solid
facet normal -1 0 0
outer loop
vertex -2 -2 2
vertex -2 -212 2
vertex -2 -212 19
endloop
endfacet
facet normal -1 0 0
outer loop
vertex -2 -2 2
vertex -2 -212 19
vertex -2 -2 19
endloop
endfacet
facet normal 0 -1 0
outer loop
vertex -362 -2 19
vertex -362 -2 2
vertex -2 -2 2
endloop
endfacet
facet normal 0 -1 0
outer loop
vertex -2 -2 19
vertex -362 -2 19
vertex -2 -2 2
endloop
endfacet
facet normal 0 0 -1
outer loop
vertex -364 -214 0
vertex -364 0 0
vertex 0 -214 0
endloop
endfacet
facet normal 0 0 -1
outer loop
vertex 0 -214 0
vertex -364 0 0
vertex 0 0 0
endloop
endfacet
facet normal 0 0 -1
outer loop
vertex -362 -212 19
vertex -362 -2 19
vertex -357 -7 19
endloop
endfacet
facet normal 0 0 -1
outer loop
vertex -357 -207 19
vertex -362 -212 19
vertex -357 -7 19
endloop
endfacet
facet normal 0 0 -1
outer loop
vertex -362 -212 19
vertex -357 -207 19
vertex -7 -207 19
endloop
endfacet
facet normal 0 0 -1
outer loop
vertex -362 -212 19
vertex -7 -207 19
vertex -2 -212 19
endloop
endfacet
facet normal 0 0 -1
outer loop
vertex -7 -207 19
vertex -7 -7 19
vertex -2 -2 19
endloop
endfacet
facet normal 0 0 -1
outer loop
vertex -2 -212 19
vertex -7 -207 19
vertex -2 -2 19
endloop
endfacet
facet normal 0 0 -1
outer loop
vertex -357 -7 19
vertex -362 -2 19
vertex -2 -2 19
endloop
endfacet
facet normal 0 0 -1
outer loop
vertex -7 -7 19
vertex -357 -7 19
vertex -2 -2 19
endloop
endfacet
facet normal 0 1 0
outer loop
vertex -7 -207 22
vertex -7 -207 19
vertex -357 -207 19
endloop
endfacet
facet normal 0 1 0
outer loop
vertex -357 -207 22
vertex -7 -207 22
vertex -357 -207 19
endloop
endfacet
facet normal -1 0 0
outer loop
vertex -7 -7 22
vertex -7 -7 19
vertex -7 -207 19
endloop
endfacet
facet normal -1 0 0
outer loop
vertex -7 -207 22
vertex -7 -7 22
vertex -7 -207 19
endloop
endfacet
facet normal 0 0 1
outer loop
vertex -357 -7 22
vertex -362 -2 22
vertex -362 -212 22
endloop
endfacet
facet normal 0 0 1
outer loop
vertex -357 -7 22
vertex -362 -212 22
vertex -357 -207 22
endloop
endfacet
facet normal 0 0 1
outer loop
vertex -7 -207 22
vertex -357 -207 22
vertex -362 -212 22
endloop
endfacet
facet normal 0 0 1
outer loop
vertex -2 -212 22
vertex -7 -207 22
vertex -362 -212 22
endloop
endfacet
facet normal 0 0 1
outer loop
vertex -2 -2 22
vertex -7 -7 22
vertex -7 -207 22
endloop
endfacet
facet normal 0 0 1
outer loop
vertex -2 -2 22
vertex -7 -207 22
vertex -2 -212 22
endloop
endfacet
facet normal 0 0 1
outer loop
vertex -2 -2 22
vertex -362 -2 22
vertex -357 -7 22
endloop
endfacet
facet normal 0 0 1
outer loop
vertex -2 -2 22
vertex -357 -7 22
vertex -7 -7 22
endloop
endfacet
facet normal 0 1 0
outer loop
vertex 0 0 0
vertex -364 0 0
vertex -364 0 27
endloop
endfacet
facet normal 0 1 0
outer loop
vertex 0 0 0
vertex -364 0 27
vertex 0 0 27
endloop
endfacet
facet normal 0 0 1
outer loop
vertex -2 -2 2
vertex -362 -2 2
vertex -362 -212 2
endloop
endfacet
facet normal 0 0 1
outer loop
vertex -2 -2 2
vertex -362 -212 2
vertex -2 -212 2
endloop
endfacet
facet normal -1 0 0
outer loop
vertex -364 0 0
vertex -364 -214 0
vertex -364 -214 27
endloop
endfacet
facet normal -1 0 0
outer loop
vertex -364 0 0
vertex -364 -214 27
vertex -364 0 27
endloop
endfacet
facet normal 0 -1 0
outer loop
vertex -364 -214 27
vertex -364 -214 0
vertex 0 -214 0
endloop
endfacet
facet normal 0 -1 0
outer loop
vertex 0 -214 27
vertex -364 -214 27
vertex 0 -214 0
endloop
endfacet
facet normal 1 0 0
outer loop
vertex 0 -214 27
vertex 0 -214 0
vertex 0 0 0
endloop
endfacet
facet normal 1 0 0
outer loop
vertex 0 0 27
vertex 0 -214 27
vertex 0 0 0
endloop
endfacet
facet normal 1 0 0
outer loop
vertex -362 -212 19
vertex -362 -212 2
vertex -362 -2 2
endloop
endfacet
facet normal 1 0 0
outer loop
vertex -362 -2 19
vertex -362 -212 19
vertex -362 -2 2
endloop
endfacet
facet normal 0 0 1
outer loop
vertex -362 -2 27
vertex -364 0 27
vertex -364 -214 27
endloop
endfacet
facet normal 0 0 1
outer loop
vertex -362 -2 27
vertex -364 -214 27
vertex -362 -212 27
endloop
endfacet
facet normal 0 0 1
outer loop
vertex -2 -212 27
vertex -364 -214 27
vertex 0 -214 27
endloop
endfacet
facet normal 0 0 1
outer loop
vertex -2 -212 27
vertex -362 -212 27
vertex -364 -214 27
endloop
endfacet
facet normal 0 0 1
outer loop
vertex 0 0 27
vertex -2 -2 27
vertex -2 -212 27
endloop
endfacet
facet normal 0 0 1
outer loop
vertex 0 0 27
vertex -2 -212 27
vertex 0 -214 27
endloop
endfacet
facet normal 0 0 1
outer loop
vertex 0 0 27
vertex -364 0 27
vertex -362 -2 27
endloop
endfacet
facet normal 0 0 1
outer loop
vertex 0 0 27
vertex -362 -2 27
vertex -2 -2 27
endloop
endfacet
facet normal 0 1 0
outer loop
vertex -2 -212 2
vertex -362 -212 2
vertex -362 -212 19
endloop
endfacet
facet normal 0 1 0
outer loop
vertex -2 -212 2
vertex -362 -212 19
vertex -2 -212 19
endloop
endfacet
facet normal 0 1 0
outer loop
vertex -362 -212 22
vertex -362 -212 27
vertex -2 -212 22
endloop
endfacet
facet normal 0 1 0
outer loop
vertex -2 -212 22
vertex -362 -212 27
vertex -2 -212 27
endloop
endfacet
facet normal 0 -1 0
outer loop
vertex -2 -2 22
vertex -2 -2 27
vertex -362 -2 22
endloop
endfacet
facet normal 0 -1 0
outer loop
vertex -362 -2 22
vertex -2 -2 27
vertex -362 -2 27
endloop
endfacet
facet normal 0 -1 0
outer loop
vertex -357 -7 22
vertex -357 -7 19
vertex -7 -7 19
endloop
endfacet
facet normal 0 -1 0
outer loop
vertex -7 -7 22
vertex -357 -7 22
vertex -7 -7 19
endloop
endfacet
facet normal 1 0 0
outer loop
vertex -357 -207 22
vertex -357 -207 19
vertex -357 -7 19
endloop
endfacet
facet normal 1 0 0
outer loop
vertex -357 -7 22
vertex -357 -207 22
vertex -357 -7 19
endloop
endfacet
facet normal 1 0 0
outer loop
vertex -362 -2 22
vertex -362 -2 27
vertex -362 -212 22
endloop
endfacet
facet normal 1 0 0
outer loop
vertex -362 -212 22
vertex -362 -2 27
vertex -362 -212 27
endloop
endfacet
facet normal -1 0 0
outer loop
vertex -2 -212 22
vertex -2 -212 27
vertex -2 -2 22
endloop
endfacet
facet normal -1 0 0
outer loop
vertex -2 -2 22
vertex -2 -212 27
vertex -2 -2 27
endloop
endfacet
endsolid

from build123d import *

# Parameters (mm, degrees)
F0_W     = 364
F0_H     = 214
F1_DEPTH = 27
F3_DEPTH = 25
F4_W     = 360
F4_H     = 210
F5_DEPTH = 20
F6_DEPTH = 17


with BuildPart() as f1:
    # F0 (on Top) → F1 (new body)
    with BuildSketch(Plane.XY):
        with Locations((-182, -107)):
            Rectangle(F0_W, F0_H)
    extrude(amount=F1_DEPTH)

    # F2 (on face) → F3 (cut)
    with BuildSketch(Plane.XY.offset(27)):
        Polygon((-2, -2), (-246.590644, -2), (-362, -2), (-362, -107), (-362, -212), (-247.691646, -212), (-2, -212), (-2, -112.870261), align=None)
    extrude(amount=-F3_DEPTH, mode=Mode.SUBTRACT)

    # F4 (on face) → F5 (join)
    with BuildSketch(Plane.XY.offset(2)):
        with Locations((-182, -107)):
            Rectangle(F4_W, F4_H)
        Polygon((-357, -207), (-357, -107), (-357, -7), (-279.820502, -7), (-7, -7), (-7, -107), (-7, -207), (-279.820502, -207), align=None, mode=Mode.SUBTRACT)
    extrude(amount=F5_DEPTH)

    # F4 (on face) → F6 (cut)
    with BuildSketch(Plane.XY.offset(2)):
        with Locations((-182, -107)):
            Rectangle(F4_W, F4_H)
        Polygon((-357, -207), (-357, -107), (-357, -7), (-279.820502, -7), (-7, -7), (-7, -107), (-7, -207), (-279.820502, -207), align=None, mode=Mode.SUBTRACT)
    extrude(amount=F6_DEPTH, mode=Mode.SUBTRACT)


solid = f1.part
